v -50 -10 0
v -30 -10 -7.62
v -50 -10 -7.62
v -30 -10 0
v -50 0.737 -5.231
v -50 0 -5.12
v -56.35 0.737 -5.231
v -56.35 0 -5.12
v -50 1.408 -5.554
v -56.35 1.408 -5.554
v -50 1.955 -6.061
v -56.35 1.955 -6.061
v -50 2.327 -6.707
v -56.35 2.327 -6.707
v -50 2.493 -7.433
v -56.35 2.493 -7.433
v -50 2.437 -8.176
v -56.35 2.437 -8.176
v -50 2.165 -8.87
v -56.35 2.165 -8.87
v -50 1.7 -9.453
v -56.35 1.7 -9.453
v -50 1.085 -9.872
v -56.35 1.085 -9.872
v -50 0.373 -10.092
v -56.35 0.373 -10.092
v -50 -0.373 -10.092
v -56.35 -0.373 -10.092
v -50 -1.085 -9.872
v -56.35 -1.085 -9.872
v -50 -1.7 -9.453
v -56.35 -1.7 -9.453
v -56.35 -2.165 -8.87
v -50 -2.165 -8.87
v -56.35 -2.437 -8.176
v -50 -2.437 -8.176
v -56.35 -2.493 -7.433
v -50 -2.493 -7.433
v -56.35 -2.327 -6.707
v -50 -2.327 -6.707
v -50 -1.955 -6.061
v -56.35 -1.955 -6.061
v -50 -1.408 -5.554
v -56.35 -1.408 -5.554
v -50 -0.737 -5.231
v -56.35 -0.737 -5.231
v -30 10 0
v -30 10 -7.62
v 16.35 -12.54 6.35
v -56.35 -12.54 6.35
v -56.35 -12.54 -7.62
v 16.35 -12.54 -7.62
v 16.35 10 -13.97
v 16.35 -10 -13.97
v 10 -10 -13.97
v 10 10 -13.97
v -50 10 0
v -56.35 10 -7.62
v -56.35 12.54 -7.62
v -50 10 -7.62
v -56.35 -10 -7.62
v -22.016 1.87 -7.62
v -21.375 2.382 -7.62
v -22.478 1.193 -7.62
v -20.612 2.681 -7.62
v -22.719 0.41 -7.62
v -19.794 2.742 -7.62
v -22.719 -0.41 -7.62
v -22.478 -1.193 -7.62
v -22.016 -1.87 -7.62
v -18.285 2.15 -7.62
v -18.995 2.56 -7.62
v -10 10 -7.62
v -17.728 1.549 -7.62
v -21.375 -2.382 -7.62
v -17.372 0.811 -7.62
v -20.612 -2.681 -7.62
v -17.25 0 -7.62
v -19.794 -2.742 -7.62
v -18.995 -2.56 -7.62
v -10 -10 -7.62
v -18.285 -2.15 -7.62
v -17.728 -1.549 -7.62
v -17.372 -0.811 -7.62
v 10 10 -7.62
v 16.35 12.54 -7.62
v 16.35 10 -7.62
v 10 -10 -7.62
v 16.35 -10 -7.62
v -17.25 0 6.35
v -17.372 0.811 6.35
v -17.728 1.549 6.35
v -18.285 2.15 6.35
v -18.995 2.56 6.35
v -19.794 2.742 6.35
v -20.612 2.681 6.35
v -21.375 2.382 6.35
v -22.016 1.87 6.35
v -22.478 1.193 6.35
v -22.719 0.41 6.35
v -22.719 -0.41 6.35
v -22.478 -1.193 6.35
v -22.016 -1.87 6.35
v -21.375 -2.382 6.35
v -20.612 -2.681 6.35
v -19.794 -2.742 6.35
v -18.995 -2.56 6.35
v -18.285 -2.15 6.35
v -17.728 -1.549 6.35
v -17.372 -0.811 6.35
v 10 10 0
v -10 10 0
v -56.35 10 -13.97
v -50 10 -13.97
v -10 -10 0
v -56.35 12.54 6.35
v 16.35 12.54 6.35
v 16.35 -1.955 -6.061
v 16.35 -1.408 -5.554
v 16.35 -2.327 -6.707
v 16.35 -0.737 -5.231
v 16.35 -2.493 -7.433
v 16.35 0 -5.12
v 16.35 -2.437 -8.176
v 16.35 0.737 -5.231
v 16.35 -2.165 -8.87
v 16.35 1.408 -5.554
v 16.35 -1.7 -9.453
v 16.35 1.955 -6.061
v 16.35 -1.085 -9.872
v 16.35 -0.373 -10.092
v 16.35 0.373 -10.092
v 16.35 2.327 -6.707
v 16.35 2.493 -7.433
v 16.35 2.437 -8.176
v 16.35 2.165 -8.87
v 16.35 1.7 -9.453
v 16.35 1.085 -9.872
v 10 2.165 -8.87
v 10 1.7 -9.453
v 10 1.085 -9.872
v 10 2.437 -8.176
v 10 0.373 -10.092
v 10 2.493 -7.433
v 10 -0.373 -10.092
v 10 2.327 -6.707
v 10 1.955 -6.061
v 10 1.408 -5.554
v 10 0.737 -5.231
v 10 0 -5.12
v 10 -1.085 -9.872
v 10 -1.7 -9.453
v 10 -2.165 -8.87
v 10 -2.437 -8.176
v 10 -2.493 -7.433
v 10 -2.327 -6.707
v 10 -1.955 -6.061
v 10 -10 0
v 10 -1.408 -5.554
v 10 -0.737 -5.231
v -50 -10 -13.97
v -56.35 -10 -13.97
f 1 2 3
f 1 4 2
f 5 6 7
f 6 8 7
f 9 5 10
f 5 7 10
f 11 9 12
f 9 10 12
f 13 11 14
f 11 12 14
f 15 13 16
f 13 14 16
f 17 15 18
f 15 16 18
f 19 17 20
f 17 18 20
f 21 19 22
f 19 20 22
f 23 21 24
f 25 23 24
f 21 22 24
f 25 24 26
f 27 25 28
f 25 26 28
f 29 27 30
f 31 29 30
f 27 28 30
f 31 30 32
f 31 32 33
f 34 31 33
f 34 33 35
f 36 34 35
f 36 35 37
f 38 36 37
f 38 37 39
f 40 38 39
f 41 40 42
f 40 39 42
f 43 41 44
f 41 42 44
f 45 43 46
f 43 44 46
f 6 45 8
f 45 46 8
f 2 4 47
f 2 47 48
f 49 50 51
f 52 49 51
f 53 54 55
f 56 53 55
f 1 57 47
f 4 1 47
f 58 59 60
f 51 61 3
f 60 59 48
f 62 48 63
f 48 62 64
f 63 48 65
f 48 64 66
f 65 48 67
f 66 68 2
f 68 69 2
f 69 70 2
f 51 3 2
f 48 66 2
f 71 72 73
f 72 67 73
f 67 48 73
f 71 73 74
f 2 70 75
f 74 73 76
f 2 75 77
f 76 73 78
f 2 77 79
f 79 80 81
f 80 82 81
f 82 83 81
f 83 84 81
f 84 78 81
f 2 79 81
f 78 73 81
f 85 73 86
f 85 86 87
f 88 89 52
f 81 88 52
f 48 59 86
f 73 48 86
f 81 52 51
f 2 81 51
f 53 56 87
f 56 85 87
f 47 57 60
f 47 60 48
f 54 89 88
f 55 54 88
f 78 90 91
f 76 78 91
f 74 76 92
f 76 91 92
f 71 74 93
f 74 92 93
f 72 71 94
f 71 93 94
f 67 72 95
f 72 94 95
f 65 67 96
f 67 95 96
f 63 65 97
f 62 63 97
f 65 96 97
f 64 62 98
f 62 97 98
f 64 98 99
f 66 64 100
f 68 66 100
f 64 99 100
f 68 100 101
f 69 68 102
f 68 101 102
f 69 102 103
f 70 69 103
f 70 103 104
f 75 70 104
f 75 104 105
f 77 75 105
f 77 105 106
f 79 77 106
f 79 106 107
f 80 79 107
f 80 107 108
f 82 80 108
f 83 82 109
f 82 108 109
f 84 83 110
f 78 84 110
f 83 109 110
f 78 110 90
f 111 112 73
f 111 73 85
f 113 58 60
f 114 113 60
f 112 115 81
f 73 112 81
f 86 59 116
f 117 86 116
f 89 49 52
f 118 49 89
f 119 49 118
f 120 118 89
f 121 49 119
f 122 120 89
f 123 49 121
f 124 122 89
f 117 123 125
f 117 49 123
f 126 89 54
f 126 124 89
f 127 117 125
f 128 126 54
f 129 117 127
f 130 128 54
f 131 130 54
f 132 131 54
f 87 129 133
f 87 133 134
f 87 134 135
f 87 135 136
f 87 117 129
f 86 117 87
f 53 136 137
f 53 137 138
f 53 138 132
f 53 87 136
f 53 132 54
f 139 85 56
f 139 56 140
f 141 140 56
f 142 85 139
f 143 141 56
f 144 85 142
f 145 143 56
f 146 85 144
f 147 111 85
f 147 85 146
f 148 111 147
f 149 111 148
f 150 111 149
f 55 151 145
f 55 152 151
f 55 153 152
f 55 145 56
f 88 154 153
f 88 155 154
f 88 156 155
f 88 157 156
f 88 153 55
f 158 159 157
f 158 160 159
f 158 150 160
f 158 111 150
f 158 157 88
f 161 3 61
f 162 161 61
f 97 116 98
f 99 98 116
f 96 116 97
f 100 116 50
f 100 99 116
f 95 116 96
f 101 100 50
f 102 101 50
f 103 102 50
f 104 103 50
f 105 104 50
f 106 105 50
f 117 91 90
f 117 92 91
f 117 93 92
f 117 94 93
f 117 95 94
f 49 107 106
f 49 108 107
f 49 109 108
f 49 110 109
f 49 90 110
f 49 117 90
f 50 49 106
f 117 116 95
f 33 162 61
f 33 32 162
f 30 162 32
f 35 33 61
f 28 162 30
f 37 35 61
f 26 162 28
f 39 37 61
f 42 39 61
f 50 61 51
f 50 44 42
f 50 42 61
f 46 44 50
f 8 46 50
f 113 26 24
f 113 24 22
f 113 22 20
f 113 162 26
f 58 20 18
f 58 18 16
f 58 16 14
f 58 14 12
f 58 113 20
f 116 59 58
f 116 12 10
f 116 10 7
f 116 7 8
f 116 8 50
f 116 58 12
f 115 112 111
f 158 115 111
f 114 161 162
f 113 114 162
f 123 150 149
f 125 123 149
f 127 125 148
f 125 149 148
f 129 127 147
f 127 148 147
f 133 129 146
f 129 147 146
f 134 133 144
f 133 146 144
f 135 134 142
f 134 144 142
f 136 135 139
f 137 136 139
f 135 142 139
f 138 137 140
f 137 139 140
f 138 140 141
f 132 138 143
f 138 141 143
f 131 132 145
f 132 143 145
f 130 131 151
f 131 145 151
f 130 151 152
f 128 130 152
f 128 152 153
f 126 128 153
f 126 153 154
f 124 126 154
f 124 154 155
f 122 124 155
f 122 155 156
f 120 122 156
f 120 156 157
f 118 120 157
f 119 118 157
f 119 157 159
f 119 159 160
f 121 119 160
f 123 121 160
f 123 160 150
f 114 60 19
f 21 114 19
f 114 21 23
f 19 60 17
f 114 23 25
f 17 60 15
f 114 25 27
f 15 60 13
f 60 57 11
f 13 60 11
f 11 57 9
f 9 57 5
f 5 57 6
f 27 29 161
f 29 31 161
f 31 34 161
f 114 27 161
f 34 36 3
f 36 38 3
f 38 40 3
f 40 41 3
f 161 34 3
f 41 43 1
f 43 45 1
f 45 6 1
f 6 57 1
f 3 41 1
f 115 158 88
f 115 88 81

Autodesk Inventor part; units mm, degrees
ref_plane "YZ Plane" through (0, 0, 0) normal (1, 0, 0) x (0, 1, 0)
ref_plane "XZ Plane" through (0, 0, 0) normal (0, 1, 0) x (-1, 0, 0)
ref_plane "XY Plane" through (0, 0, 0) normal (0, 0, 1) x (1, 0, 0)
sketch "Sketch1" plane through (0, 0, 0) normal (0, 0, 1) x (1, 0, 0)
  circle A0 centre (-40, 0) radius 2.5 projected
  arc A1 (-31.25, -10) -> (-30, -8.75) centre (-31.25, -8.75) ccw projected
  line L0 (-30, -3.6) -> (-30, -8.75) projected
  line L1 (-30.5, -3.1) -> (-30, -3.6) projected
  line L2 (-31.6, -3.1) -> (-30.5, -3.1) projected
  line L3 (-31.6, -5.5) -> (-31.6, -3.1) projected
  line L4 (-33.534, -5.5) -> (-31.6, -5.5) projected
  line L5 (-35.9, -3.134) -> (-33.534, -5.5) projected
  line L6 (-35.9, 3.134) -> (-35.9, -3.134) projected
  line L7 (-33.534, 5.5) -> (-35.9, 3.134) projected
  line L8 (-31.6, 5.5) -> (-33.534, 5.5) projected
  line L9 (-31.6, 3.1) -> (-31.6, 5.5) projected
  line L10 (-30.5, 3.1) -> (-31.6, 3.1) projected
  line L11 (-30, 3.6) -> (-30.5, 3.1) projected
  line L12 (-30, 8.75) -> (-30, 3.6) projected
  arc A2 (-30, 8.75) -> (-31.25, 10) centre (-31.25, 8.75) ccw projected
  line L13 (-36.4, 10) -> (-31.25, 10) projected
  line L14 (-36.9, 9.5) -> (-36.4, 10) projected
  line L15 (-36.9, 8.4) -> (-36.9, 9.5) projected
  line L16 (-34.5, 8.4) -> (-36.9, 8.4) projected
  line L17 (-34.5, 6.466) -> (-34.5, 8.4) projected
  line L18 (-36.866, 4.1) -> (-34.5, 6.466) projected
  line L19 (-43.134, 4.1) -> (-36.866, 4.1) projected
  line L20 (-45.5, 6.466) -> (-43.134, 4.1) projected
  line L21 (-45.5, 8.4) -> (-45.5, 6.466) projected
  line L22 (-43.1, 8.4) -> (-45.5, 8.4) projected
  line L23 (-43.1, 9.5) -> (-43.1, 8.4) projected
  line L24 (-43.6, 10) -> (-43.1, 9.5) projected
  line L25 (-48.75, 10) -> (-43.6, 10) projected
  arc A3 (-48.75, 10) -> (-50, 8.75) centre (-48.75, 8.75) ccw projected
  line L26 (-50, 3.6) -> (-50, 8.75) projected
  line L27 (-49.5, 3.1) -> (-50, 3.6) projected
  line L28 (-48.4, 3.1) -> (-49.5, 3.1) projected
  line L29 (-48.4, 5.5) -> (-48.4, 3.1) projected
  line L30 (-46.466, 5.5) -> (-48.4, 5.5) projected
  line L31 (-44.1, 3.134) -> (-46.466, 5.5) projected
  line L32 (-44.1, -3.134) -> (-44.1, 3.134) projected
  line L33 (-46.466, -5.5) -> (-44.1, -3.134) projected
  line L34 (-48.4, -5.5) -> (-46.466, -5.5) projected
  line L35 (-48.4, -3.1) -> (-48.4, -5.5) projected
  line L36 (-49.5, -3.1) -> (-48.4, -3.1) projected
  line L37 (-50, -3.6) -> (-49.5, -3.1) projected
  line L38 (-50, -8.75) -> (-50, -3.6) projected
  arc A4 (-50, -8.75) -> (-48.75, -10) centre (-48.75, -8.75) ccw projected
  line L39 (-43.6, -10) -> (-48.75, -10) projected
  line L40 (-43.1, -9.5) -> (-43.6, -10) projected
  line L41 (-43.1, -8.4) -> (-43.1, -9.5) projected
  line L42 (-45.5, -8.4) -> (-43.1, -8.4) projected
  line L43 (-45.5, -6.466) -> (-45.5, -8.4) projected
  line L44 (-43.134, -4.1) -> (-45.5, -6.466) projected
  line L45 (-36.866, -4.1) -> (-43.134, -4.1) projected
  line L46 (-34.5, -6.466) -> (-36.866, -4.1) projected
  line L47 (-34.5, -8.4) -> (-34.5, -6.466) projected
  line L48 (-36.9, -8.4) -> (-34.5, -8.4) projected
  line L49 (-36.9, -9.5) -> (-36.9, -8.4) projected
  line L50 (-36.4, -10) -> (-36.9, -9.5) projected
  line L51 (-31.25, -10) -> (-36.4, -10) projected
  circle A5 centre (0, 0) radius 2.5 projected
  arc A6 (8.75, -10) -> (10, -8.75) centre (8.75, -8.75) ccw projected
  line L52 (10, -3.6) -> (10, -8.75) projected
  line L53 (9.5, -3.1) -> (10, -3.6) projected
  line L54 (8.4, -3.1) -> (9.5, -3.1) projected
  line L55 (8.4, -5.5) -> (8.4, -3.1) projected
  line L56 (6.466, -5.5) -> (8.4, -5.5) projected
  line L57 (4.1, -3.134) -> (6.466, -5.5) projected
  line L58 (4.1, 3.134) -> (4.1, -3.134) projected
  line L59 (6.466, 5.5) -> (4.1, 3.134) projected
  line L60 (8.4, 5.5) -> (6.466, 5.5) projected
  line L61 (8.4, 3.1) -> (8.4, 5.5) projected
  line L62 (9.5, 3.1) -> (8.4, 3.1) projected
  line L63 (10, 3.6) -> (9.5, 3.1) projected
  line L64 (10, 8.75) -> (10, 3.6) projected
  arc A7 (10, 8.75) -> (8.75, 10) centre (8.75, 8.75) ccw projected
  line L65 (3.6, 10) -> (8.75, 10) projected
  line L66 (3.1, 9.5) -> (3.6, 10) projected
  line L67 (3.1, 8.4) -> (3.1, 9.5) projected
  line L68 (5.5, 8.4) -> (3.1, 8.4) projected
  line L69 (5.5, 6.466) -> (5.5, 8.4) projected
  line L70 (3.134, 4.1) -> (5.5, 6.466) projected
  line L71 (-3.134, 4.1) -> (3.134, 4.1) projected
  line L72 (-5.5, 6.466) -> (-3.134, 4.1) projected
  line L73 (-5.5, 8.4) -> (-5.5, 6.466) projected
  line L74 (-3.1, 8.4) -> (-5.5, 8.4) projected
  line L75 (-3.1, 9.5) -> (-3.1, 8.4) projected
  line L76 (-3.6, 10) -> (-3.1, 9.5) projected
  line L77 (-8.75, 10) -> (-3.6, 10) projected
  arc A8 (-8.75, 10) -> (-10, 8.75) centre (-8.75, 8.75) ccw projected
  line L78 (-10, 3.6) -> (-10, 8.75) projected
  line L79 (-9.5, 3.1) -> (-10, 3.6) projected
  line L80 (-8.4, 3.1) -> (-9.5, 3.1) projected
  line L81 (-8.4, 5.5) -> (-8.4, 3.1) projected
  line L82 (-6.466, 5.5) -> (-8.4, 5.5) projected
  line L83 (-4.1, 3.134) -> (-6.466, 5.5) projected
  line L84 (-4.1, -3.134) -> (-4.1, 3.134) projected
  line L85 (-6.466, -5.5) -> (-4.1, -3.134) projected
  line L86 (-8.4, -5.5) -> (-6.466, -5.5) projected
  line L87 (-8.4, -3.1) -> (-8.4, -5.5) projected
  line L88 (-9.5, -3.1) -> (-8.4, -3.1) projected
  line L89 (-10, -3.6) -> (-9.5, -3.1) projected
  line L90 (-10, -8.75) -> (-10, -3.6) projected
  arc A9 (-10, -8.75) -> (-8.75, -10) centre (-8.75, -8.75) ccw projected
  line L91 (-3.6, -10) -> (-8.75, -10) projected
  line L92 (-3.1, -9.5) -> (-3.6, -10) projected
  line L93 (-3.1, -8.4) -> (-3.1, -9.5) projected
  line L94 (-5.5, -8.4) -> (-3.1, -8.4) projected
  line L95 (-5.5, -6.466) -> (-5.5, -8.4) projected
  line L96 (-3.134, -4.1) -> (-5.5, -6.466) projected
  line L97 (3.134, -4.1) -> (-3.134, -4.1) projected
  line L98 (5.5, -6.466) -> (3.134, -4.1) projected
  line L99 (5.5, -8.4) -> (5.5, -6.466) projected
  line L100 (3.1, -8.4) -> (5.5, -8.4) projected
  line L101 (3.1, -9.5) -> (3.1, -8.4) projected
  line L102 (3.6, -10) -> (3.1, -9.5) projected
  line L103 (8.75, -10) -> (3.6, -10) projected
  line L104 (-50, -10) -> (-50, 10)
  line L105 (10, 10) -> (10, -10)
  line L106 (-30, -10) -> (-30, 10)
  line L107 (-10, 10) -> (-10, -10)
  line L108 (-52.54, -12.54) -> (12.54, -12.54)
  line L109 (12.54, -12.54) -> (12.54, 12.54)
  line L110 (12.54, 12.54) -> (-52.54, 12.54)
  line L111 (-52.54, 12.54) -> (-52.54, -12.54)
  line L112 (10, -10) -> (-10, -10)
  line L113 (-30, -10) -> (-50, -10)
  line L114 (-50, 10) -> (-30, 10)
  line L115 (-10, 10) -> (10, 10)
  point P0 (0, 0)
extrude "Extrusion1" add sketch "Sketch1" against normal blind 7.62 contours L111 L110 L109 L108
sketch "Sketch2" plane through (0, 0, 0) normal (0, 0, 1) x (1, 0, 0)
  line L0 (-52.54, -12.54) -> (-52.54, 12.54) projected
  line L1 (12.54, -12.54) -> (12.54, 12.54) projected
  line L2 (-52.54, -12.54) -> (12.54, -12.54)
  line L3 (12.54, -12.54) -> (12.54, 12.54)
  line L4 (12.54, 12.54) -> (-52.54, 12.54)
  line L5 (-52.54, 12.54) -> (-52.54, -12.54)
  point P0 (0, 0)
extrude "Extrusion2" add sketch "Sketch2" along normal blind 6.35
sketch "Sketch3" plane through (12.54, -12.54, -7.62) normal (1, 0, 0) x (0, 0, -1)
  line L0 (0, 0) -> (-13.97, 0) projected
  line L1 (0, 25.08) -> (0, 0) projected
  line L2 (0, 25.08) -> (-13.97, 25.08) projected
  line L3 (-13.97, 0) -> (-13.97, 25.08) projected
  point P0 (-7.62, 12.54)
extrude "Extrusion3" add sketch "Sketch3" along normal blind 3.81
sketch "Sketch4" plane through (-52.54, -12.54, -7.62) normal (-1, 0, 0) x (0, 0, 1)
  line L0 (0, 25.08) -> (13.97, 25.08) projected
  line L1 (0, 0) -> (0, 25.08) projected
  line L2 (13.97, 0) -> (0, 0) projected
  line L3 (13.97, 25.08) -> (13.97, 0) projected
  point P0 (7.62, 12.54)
extrude "Extrusion4" add sketch "Sketch4" along normal blind 3.81
sketch "Sketch5" plane through (0, 0, -7.62) normal (0, 0, -1) x (-1, 0, 0)
  line L0 (-16.35, -12.54) -> (-16.35, 12.54) projected
  line L1 (56.35, -12.54) -> (-16.35, -12.54) projected
  line L2 (-16.35, 12.54) -> (-10, 12.54)
  line L3 (-10, 12.54) -> (-10, -12.54)
  line L4 (-10, -12.54) -> (-16.35, -12.54)
  line L5 (-16.35, -12.54) -> (-16.35, 12.54)
  line L6 (56.35, 12.54) -> (50, 12.54)
  line L7 (50, 12.54) -> (50, -12.54)
  line L8 (50, -12.54) -> (56.35, -12.54)
  line L9 (56.35, -12.54) -> (56.35, 12.54)
  line L10 (50, 10) -> (50, -10) projected
  line L11 (-10, -10) -> (-10, 10) projected
  line L12 (50, 12.54) -> (56.35, -12.54) construction
  line L13 (-16.35, 12.54) -> (56.35, 12.54) construction
  line L14 (-16.35, 12.54) -> (-10, -12.54) construction
  line L15 (-16.35, -10) -> (-10, -10)
  line L16 (-10, -10) -> (-10, 10)
  line L17 (-10, 10) -> (-16.35, 10)
  line L18 (-16.35, 10) -> (-16.35, -10)
  line L19 (-16.35, -10) -> (-10, 10) construction
  line L20 (-10, -10) -> (-16.35, 10) construction
  line L21 (50, -10) -> (56.35, -10)
  line L22 (56.35, -10) -> (56.35, 10)
  line L23 (56.35, 10) -> (50, 10)
  line L24 (50, 10) -> (50, -10)
  line L25 (50, -10) -> (56.35, 10) construction
  line L26 (56.35, -10) -> (50, 10) construction
  point P0 (0, 0)
  point P1 (-13.175, 0)
  point P2 (53.175, 0)
  dimension "d10" = 0
  dimension "d11" = 0
  dimension "d20" = 0
  dimension "d21" = 20
  dimension "d22" = 0
extrude "Extrusion5" add sketch "Sketch5" along normal blind 6.35 contours L0 L17 L3 L15 | L7 L23 L9 L21
sketch "Sketch6" plane through (-56.35, -12.54, -7.62) normal (-1, 0, 0) x (0, 0, 1)
  line L0 (0, 25.08) -> (13.97, 25.08) projected
  circle A0 centre (0, 12.54) radius 2.5
  line L1 (13.97, 25.08) -> (0, 25.08) projected
  line L2 (0, 25.08) -> (0, -0.9572)
  line L3 (-6.35, 2.54) -> (-6.35, 22.54) projected
  point P0 (7.62, 12.54)
  dimension "d14" = 5
  dimension "d23" = 6.35
extrude "Extrusion6" cut sketch "Sketch6" against normal through all
sketch "Sketch8" plane through (-10, -10, 0) normal (1, 0, 0) x (0, 0, -1)
  arc A0 (7.62, 12.5) -> (7.62, 7.5) centre (7.62, 10) ccw projected
  line L0 (7.62, 7.5) -> (7.62, 0) projected
  line L1 (7.62, 12.5) -> (7.62, 7.5)
  point P0 (0, 10)
extrude "Extrusion7" add sketch "Sketch8" against normal up to surface (20 mm away)
sketch "Sketch9" plane through (0, 0, 6.35) normal (0, 0, 1) x (1, 0, 0)
  line L0 (16.35, 12.54) -> (-56.35, 12.54) construction
  line L1 (-56.35, -12.54) -> (16.35, -12.54) construction
  line L2 (16.35, 12.54) -> (-56.35, -12.54) construction
  circle A0 centre (-20, 0) radius 2.75
  point P0 (0, 0)
  dimension "d24" = 5.5
extrude "Extrusion8" cut sketch "Sketch9" against normal blind 25.4
properties part number "cap"
